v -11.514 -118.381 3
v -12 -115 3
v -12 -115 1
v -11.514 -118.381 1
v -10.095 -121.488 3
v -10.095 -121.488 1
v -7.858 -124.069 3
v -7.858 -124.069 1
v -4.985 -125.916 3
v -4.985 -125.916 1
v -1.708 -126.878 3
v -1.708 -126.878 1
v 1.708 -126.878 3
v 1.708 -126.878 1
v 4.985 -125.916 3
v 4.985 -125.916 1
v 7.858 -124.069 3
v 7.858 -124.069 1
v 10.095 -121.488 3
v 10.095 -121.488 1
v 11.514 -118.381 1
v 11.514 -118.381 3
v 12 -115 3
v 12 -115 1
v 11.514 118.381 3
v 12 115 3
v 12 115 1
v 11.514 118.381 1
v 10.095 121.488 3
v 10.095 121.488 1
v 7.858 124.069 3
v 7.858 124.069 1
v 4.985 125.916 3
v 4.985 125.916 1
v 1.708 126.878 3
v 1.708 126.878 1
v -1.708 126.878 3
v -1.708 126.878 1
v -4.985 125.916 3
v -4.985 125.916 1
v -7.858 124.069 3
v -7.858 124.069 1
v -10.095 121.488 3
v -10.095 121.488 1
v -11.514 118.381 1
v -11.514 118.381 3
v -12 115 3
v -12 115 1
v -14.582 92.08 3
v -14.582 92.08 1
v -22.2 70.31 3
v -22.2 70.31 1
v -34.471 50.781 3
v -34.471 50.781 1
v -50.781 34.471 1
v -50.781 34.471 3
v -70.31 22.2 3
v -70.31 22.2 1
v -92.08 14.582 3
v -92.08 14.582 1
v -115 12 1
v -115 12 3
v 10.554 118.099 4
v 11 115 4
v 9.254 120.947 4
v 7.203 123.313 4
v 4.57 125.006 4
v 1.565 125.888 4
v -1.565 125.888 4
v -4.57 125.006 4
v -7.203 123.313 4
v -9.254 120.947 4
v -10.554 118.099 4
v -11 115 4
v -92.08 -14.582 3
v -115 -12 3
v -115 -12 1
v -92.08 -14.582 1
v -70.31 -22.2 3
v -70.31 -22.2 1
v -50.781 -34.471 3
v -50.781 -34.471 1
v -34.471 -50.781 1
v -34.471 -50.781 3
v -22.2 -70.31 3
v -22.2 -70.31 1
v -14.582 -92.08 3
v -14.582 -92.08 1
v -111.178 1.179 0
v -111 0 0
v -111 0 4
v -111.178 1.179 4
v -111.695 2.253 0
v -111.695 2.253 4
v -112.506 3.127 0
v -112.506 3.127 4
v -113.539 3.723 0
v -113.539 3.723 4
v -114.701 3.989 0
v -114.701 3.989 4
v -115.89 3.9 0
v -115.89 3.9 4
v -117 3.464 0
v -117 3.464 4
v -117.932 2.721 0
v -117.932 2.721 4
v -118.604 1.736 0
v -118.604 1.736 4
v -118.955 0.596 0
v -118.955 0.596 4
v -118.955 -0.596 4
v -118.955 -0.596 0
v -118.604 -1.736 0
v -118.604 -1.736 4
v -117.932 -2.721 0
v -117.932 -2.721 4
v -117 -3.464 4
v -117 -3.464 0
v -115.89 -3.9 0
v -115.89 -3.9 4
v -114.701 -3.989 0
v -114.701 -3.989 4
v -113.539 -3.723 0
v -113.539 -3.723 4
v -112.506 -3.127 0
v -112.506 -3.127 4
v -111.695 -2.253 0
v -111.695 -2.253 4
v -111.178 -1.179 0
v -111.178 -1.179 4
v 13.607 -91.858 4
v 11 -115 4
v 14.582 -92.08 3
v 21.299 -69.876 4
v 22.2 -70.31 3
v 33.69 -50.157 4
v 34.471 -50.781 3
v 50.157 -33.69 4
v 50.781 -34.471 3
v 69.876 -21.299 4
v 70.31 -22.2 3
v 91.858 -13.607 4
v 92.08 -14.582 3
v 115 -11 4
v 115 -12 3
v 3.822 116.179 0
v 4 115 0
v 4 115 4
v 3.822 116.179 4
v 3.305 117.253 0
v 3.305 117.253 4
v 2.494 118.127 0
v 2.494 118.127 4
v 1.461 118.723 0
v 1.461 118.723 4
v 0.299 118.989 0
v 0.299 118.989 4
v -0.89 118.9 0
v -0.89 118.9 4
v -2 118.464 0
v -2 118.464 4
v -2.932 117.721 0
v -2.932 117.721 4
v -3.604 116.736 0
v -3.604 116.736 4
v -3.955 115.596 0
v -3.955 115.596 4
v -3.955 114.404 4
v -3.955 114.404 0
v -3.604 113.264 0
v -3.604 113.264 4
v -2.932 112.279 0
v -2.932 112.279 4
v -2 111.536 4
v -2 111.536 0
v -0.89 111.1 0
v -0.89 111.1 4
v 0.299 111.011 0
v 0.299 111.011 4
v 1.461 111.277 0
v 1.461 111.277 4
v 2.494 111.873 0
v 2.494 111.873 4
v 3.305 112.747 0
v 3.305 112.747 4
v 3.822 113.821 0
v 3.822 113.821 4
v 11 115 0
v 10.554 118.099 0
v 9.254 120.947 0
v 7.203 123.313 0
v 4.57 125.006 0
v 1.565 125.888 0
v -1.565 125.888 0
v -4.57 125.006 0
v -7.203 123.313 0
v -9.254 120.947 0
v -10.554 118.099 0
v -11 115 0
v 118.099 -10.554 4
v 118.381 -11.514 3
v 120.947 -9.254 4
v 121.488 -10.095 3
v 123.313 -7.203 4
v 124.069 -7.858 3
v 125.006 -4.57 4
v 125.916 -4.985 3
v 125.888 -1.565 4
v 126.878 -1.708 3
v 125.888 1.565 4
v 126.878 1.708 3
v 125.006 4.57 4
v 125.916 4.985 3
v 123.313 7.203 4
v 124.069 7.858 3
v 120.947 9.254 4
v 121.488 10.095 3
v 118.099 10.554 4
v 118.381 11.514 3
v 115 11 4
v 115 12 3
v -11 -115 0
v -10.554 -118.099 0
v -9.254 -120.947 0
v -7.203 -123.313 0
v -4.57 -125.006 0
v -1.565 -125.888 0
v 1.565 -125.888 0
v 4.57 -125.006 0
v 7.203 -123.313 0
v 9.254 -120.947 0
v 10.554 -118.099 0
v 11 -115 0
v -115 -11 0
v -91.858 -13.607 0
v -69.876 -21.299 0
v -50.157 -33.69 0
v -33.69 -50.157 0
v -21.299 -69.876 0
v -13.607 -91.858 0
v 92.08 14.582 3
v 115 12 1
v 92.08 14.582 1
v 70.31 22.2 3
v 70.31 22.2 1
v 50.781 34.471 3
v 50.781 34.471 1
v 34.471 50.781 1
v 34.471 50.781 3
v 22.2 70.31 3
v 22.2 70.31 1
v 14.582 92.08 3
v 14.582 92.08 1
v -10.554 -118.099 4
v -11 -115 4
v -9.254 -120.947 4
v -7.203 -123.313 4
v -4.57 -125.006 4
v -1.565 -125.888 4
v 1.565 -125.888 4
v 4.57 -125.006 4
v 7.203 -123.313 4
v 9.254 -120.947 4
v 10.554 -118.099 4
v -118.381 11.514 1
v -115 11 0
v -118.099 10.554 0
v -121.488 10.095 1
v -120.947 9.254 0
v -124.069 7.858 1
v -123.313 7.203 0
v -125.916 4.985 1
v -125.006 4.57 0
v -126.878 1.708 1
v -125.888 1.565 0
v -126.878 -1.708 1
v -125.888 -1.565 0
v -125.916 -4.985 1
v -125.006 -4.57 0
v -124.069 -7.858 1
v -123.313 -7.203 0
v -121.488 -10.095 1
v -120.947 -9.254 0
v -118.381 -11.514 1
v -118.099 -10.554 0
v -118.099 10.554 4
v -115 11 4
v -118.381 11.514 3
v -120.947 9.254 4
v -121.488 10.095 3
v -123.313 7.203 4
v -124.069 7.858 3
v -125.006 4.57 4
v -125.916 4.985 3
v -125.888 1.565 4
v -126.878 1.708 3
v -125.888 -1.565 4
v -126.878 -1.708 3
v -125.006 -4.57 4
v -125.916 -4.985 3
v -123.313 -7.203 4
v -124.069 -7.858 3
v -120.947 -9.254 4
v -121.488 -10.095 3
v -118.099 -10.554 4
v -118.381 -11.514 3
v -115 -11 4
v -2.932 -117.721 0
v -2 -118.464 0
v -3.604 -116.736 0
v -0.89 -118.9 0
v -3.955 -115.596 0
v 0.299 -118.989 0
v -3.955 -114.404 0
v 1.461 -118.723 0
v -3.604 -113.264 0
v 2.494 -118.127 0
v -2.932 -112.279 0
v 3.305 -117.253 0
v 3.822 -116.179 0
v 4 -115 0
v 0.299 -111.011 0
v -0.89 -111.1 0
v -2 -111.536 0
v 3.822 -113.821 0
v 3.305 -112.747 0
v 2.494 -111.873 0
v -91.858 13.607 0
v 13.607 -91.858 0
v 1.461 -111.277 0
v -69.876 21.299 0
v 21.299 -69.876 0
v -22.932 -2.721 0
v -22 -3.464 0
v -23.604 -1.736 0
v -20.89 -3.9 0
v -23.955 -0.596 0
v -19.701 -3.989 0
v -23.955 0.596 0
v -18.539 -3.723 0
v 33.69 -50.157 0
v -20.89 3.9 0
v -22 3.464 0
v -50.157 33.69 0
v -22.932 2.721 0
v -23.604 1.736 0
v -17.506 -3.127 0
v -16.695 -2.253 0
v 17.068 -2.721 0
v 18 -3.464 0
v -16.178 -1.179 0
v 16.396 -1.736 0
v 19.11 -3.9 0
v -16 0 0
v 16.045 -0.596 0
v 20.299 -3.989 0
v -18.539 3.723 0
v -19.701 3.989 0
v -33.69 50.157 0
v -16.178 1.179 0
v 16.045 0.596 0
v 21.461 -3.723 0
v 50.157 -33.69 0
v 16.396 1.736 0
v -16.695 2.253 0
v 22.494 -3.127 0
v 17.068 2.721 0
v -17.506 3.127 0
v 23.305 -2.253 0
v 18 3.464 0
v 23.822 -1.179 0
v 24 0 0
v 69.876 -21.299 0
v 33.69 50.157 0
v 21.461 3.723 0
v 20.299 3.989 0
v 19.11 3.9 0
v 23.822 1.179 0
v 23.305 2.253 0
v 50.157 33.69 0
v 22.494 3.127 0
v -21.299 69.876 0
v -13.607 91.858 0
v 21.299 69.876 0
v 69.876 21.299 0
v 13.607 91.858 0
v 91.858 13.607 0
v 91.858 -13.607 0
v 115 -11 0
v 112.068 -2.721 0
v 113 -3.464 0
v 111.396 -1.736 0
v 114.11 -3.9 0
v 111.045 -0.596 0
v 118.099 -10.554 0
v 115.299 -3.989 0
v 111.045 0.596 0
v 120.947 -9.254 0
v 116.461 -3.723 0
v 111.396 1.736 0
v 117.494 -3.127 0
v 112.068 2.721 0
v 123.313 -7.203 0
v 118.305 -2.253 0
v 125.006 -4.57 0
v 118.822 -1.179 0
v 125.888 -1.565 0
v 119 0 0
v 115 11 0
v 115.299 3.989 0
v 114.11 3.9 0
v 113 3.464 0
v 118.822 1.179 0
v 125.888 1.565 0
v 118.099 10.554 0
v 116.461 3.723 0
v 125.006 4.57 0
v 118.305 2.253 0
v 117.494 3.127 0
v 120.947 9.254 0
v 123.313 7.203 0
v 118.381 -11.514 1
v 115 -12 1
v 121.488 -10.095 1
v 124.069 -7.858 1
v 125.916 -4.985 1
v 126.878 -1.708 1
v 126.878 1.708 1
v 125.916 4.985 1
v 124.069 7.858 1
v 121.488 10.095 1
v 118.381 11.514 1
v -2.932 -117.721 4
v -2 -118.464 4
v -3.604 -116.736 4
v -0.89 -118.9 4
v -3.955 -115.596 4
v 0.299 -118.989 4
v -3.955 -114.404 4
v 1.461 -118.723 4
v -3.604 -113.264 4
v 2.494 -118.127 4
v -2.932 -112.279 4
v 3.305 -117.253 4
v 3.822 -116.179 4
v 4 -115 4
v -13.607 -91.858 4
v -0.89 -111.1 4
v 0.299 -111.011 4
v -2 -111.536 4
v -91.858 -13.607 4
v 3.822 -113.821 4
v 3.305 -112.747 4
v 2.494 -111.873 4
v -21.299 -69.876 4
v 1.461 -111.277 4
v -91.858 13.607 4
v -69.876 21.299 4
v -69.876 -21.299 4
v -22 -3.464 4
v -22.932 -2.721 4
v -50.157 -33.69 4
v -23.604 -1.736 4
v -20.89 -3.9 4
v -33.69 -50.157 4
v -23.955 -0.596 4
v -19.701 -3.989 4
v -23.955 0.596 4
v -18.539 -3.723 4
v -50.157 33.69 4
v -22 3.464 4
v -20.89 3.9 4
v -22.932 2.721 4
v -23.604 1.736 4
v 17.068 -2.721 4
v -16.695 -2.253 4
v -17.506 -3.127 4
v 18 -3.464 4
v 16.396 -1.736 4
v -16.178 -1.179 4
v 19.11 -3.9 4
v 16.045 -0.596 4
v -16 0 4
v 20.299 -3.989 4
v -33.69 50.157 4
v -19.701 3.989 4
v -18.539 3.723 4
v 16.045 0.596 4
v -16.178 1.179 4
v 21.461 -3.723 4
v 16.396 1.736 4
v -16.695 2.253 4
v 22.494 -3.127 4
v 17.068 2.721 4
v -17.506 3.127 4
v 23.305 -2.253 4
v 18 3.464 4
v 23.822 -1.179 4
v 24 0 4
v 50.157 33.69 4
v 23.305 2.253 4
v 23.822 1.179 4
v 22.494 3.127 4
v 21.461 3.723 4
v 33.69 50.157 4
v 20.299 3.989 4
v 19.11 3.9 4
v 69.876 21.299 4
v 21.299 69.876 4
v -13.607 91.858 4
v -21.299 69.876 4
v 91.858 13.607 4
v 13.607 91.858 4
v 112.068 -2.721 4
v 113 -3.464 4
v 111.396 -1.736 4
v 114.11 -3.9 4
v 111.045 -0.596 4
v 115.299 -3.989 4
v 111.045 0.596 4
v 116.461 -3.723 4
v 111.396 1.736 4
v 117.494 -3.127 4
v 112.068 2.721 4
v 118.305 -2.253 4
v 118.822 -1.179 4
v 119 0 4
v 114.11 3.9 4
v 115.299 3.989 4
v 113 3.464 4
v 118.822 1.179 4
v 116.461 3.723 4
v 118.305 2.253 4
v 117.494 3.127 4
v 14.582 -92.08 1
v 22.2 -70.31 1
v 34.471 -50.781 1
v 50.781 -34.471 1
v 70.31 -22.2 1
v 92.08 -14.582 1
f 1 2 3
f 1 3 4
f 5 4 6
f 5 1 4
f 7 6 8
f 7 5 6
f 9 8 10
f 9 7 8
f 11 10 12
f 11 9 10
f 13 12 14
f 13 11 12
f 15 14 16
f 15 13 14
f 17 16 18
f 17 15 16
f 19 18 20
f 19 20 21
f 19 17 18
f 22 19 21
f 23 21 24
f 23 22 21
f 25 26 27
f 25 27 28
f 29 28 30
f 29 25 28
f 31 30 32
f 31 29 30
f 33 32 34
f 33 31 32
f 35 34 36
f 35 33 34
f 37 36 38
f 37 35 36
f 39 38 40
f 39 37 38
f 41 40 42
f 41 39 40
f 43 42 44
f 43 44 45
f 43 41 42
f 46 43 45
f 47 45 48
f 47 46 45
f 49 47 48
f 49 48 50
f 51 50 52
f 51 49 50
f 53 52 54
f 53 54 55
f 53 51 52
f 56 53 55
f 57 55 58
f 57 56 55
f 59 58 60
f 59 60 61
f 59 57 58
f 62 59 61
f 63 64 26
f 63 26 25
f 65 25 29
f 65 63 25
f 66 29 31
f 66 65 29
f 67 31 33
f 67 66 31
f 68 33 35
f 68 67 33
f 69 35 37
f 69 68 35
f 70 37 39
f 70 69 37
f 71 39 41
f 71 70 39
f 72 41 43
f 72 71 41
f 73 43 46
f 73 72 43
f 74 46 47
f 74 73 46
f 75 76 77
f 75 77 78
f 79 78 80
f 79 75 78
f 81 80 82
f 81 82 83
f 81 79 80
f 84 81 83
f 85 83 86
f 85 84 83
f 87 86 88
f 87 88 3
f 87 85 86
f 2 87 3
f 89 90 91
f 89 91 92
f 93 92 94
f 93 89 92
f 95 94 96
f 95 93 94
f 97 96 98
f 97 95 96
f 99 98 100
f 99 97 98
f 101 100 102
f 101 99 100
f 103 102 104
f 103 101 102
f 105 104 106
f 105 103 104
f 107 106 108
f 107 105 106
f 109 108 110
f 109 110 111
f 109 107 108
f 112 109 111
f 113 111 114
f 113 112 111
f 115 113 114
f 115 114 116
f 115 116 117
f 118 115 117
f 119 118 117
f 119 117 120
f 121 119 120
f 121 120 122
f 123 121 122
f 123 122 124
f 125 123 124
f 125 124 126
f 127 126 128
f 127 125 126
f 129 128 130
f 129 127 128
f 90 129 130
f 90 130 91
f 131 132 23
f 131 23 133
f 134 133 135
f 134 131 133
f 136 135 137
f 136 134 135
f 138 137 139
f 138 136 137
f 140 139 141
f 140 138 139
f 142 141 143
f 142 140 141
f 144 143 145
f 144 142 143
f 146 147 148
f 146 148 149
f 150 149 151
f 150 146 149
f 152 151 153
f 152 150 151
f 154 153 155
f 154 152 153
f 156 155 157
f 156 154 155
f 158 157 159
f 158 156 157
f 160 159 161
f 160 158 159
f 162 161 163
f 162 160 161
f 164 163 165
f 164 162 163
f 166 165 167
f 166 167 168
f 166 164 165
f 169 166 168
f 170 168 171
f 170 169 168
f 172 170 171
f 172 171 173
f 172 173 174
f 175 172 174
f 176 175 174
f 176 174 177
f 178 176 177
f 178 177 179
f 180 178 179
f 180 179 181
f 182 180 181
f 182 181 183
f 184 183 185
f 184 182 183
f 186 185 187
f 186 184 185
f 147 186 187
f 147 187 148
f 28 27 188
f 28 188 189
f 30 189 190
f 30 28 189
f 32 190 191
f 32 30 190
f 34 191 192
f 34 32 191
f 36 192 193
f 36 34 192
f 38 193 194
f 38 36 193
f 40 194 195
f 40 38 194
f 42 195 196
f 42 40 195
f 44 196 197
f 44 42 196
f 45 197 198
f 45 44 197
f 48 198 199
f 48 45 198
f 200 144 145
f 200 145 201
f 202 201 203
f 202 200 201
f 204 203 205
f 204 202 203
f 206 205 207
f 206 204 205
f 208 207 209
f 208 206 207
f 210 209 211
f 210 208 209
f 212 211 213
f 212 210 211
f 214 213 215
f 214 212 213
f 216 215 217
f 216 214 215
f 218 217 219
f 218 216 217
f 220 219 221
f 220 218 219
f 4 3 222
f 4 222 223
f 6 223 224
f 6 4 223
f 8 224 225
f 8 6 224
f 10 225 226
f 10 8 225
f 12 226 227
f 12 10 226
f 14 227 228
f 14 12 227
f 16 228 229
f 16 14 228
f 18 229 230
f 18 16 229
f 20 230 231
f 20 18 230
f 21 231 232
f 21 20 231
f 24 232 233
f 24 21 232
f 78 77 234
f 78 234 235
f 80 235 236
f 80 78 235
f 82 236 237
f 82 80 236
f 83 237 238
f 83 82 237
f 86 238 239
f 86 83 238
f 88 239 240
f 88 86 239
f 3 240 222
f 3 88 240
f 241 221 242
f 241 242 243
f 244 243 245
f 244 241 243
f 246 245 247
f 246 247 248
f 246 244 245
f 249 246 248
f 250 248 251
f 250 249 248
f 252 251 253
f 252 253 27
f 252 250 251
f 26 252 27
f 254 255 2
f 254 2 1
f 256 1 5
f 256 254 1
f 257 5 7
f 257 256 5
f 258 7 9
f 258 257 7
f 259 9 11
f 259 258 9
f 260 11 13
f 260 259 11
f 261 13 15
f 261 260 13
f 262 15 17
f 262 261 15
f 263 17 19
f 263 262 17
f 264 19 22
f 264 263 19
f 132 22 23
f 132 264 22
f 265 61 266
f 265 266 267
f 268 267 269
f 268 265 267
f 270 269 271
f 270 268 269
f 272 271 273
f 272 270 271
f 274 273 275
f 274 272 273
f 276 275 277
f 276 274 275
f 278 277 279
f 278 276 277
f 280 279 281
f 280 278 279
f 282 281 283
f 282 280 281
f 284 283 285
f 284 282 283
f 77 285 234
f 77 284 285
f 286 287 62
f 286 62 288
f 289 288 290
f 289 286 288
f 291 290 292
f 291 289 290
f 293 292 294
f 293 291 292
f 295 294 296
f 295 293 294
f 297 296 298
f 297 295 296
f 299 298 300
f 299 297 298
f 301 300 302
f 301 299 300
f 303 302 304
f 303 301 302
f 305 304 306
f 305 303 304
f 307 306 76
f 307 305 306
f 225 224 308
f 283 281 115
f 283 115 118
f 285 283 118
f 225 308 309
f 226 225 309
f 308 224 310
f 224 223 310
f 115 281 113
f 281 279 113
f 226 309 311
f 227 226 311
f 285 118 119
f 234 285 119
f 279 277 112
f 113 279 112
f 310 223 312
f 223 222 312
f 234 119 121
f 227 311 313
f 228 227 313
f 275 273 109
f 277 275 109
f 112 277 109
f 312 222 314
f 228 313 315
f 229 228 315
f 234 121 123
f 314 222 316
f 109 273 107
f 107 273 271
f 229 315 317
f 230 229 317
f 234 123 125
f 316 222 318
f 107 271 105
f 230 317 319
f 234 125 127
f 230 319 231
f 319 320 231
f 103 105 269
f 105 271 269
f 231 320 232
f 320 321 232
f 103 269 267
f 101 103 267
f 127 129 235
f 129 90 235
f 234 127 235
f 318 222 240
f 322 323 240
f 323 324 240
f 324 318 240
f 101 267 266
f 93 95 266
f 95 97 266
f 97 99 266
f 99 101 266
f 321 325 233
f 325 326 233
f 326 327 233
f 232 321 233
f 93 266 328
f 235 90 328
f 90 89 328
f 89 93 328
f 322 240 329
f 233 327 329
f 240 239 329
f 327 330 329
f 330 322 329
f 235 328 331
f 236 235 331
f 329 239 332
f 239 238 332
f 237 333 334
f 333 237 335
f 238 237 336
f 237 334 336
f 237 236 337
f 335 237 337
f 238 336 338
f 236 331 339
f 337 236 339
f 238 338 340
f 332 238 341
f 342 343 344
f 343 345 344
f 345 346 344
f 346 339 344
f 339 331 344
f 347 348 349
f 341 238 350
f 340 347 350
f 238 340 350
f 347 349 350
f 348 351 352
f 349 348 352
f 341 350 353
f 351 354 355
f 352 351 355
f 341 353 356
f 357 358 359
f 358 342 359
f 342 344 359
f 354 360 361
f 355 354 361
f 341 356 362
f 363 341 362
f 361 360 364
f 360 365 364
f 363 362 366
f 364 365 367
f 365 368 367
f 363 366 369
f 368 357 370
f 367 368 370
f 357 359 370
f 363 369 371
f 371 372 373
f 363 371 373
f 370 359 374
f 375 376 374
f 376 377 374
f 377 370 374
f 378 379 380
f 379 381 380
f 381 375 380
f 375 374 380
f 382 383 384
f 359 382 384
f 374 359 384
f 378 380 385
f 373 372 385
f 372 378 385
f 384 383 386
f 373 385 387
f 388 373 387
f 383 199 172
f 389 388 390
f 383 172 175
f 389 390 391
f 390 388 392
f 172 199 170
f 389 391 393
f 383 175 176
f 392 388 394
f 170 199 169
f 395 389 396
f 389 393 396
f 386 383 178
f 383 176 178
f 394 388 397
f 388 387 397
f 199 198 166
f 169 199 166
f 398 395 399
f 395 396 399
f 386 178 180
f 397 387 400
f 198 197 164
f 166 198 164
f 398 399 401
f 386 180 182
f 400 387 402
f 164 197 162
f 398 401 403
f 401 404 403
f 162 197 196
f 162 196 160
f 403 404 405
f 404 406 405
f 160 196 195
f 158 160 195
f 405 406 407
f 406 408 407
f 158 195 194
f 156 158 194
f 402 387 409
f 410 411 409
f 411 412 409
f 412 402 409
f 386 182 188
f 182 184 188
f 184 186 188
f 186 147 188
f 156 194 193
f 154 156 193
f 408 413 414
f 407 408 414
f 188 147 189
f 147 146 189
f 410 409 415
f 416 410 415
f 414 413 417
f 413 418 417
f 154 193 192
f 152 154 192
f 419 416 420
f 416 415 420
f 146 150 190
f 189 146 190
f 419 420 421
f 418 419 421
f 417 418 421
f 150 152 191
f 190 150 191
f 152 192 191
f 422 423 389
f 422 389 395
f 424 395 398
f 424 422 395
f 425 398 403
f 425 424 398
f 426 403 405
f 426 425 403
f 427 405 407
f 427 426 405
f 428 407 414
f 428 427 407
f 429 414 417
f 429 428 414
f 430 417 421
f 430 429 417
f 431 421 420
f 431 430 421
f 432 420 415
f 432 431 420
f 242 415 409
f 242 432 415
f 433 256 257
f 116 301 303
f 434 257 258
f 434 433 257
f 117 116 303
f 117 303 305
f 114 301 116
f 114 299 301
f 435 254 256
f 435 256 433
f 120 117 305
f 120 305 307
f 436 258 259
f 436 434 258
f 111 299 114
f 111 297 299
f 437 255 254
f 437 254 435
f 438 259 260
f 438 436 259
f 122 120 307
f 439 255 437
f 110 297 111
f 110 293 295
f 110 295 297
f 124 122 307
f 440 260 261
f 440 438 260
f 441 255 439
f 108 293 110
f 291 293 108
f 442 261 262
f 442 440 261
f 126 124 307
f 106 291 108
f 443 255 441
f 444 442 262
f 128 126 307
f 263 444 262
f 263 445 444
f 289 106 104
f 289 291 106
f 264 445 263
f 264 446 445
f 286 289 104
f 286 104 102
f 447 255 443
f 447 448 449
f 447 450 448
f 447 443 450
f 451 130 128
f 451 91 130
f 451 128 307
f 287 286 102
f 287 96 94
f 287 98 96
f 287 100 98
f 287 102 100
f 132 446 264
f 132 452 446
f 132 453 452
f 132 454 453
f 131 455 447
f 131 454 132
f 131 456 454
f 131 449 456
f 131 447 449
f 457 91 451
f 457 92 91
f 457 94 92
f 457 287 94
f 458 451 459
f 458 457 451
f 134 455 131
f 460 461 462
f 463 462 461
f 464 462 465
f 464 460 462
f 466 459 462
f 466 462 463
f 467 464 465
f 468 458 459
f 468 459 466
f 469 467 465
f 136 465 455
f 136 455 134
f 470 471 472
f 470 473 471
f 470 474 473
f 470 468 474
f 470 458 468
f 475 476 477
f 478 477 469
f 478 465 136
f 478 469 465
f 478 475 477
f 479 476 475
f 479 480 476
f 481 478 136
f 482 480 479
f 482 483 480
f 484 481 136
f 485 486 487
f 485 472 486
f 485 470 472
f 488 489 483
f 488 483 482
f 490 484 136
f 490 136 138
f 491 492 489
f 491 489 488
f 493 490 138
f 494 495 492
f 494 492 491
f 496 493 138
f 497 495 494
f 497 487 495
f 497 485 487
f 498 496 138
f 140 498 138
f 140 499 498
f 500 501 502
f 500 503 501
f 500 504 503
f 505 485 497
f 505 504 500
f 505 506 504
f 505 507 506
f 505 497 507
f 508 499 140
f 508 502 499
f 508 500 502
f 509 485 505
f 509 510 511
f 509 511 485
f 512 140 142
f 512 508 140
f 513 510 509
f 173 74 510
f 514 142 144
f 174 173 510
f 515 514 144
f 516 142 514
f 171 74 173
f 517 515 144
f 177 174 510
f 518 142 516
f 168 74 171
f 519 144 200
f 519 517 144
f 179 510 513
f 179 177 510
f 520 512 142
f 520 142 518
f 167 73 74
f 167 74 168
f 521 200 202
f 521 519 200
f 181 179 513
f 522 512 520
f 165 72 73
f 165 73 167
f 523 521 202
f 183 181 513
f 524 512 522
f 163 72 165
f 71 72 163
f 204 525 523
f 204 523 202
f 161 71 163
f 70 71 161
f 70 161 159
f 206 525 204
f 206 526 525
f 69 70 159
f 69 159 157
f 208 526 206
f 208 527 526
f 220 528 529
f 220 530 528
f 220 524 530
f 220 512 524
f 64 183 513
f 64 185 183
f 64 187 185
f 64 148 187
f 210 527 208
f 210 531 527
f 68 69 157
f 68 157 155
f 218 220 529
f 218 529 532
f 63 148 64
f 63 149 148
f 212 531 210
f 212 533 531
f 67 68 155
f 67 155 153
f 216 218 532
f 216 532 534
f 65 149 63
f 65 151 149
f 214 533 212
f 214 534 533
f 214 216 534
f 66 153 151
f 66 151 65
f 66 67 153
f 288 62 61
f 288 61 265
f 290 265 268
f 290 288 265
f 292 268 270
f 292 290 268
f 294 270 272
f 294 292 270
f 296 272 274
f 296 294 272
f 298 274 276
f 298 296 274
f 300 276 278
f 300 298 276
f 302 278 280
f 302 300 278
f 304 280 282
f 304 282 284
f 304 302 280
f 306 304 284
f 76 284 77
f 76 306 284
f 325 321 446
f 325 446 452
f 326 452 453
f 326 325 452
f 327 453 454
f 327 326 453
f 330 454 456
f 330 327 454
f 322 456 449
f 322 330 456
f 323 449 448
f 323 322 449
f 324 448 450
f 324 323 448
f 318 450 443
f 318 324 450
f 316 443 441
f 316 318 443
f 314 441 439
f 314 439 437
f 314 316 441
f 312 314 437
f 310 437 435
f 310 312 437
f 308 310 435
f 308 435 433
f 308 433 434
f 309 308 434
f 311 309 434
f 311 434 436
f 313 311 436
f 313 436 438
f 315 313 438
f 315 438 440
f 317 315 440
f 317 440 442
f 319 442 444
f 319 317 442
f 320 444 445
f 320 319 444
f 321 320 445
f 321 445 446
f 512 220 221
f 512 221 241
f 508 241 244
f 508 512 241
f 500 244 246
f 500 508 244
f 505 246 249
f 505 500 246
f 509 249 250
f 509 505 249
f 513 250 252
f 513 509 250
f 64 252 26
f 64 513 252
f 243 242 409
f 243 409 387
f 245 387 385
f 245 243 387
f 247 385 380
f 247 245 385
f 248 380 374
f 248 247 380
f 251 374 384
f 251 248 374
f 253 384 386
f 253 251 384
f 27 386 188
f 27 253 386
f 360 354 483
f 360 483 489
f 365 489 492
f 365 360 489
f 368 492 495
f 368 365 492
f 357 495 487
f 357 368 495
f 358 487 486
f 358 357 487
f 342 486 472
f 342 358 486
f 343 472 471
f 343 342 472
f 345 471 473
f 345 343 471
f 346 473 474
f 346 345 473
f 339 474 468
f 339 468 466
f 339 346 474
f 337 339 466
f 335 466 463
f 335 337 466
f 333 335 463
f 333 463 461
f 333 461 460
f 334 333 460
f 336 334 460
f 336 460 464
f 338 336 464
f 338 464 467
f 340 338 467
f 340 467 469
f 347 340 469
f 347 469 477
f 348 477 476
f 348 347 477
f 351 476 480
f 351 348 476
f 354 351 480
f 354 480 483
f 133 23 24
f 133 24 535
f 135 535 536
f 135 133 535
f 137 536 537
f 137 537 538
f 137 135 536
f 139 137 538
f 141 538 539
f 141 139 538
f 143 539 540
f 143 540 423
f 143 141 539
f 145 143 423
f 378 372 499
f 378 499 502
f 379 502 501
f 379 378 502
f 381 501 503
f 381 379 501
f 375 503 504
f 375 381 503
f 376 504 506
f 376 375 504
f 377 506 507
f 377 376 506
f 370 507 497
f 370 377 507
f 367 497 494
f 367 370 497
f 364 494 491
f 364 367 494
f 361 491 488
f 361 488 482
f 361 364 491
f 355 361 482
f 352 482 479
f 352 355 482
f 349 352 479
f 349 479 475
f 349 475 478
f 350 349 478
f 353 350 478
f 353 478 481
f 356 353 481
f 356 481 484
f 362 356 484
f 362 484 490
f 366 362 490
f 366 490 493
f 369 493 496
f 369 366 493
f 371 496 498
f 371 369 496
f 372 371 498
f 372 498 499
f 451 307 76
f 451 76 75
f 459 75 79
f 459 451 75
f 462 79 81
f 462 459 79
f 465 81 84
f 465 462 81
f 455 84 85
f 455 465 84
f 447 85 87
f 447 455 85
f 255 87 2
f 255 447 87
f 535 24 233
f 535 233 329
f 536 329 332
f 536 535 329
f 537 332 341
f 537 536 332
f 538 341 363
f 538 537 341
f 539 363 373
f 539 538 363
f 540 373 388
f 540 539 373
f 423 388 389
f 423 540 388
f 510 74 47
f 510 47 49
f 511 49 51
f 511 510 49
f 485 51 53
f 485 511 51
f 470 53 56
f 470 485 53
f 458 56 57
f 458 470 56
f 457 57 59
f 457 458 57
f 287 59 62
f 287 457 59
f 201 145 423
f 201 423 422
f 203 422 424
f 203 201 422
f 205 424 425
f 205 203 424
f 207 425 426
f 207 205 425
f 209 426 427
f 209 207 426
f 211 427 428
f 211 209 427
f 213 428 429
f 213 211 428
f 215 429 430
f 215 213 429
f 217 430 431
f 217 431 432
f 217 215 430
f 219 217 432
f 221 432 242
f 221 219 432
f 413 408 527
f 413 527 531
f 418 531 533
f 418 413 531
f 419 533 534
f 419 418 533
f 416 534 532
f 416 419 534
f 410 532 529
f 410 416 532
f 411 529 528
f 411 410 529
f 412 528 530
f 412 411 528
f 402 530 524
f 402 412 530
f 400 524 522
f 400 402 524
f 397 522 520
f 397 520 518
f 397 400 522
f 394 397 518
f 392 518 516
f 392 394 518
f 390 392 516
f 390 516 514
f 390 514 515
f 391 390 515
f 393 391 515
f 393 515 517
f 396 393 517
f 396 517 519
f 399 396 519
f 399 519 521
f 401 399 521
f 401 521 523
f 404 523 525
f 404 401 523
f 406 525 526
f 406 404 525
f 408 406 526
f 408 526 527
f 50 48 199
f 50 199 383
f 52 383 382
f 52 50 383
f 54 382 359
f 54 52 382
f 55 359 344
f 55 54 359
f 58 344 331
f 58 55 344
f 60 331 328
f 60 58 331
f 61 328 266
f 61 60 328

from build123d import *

# Parameters (mm, degrees)
IZIM1_R                     = 132.5
IZIM1_R_2                   = 4
Y_KSEKLIK_EKSTR_ZYON1_DEPTH = 4
SKETCH1_R                   = 147.896519427
CUT_EXTRUDE2_DEPTH          = 10
CHAMFER1_SIZE               = 1


with BuildPart() as part:
    # Çizim1 → Yükseklik-Ekstrüzyon1 (new body)
    with BuildSketch(Plane.XY):
        Circle(IZIM1_R)
        with Locations((0, 115)):
            Circle(IZIM1_R_2, mode=Mode.SUBTRACT)
        with Locations((115, 0)):
            Circle(IZIM1_R_2, mode=Mode.SUBTRACT)
        with Locations((0, -115)):
            Circle(IZIM1_R_2, mode=Mode.SUBTRACT)
        with Locations((-115, 0)):
            Circle(IZIM1_R_2, mode=Mode.SUBTRACT)
        with Locations((-20, 0)):
            Circle(IZIM1_R_2, mode=Mode.SUBTRACT)
        with Locations((20, 0)):
            Circle(IZIM1_R_2, mode=Mode.SUBTRACT)
    extrude(amount=Y_KSEKLIK_EKSTR_ZYON1_DEPTH)

    # Sketch1 → Cut-Extrude2 (cut)
    with BuildSketch(Plane.XY.offset(4)):
        Circle(SKETCH1_R)
        with BuildLine():
            ThreePointArc((12, 115), (0, 127), (-12, 115))
            ThreePointArc((-12, 115), (-42.168001538, 42.168001538), (-115, 12))
            ThreePointArc((-115, 12), (-127, 0), (-115, -12))
            ThreePointArc((-115, -12), (-42.168001538, -42.168001538), (-12, -115))
            ThreePointArc((-12, -115), (0, -127), (12, -115))
            ThreePointArc((12, -115), (42.168001538, -42.168001538), (115, -12))
            ThreePointArc((115, -12), (127, 0), (115, 12))
            ThreePointArc((115, 12), (42.168001538, 42.168001538), (12, 115))
        make_face(mode=Mode.SUBTRACT)
    extrude(amount=-CUT_EXTRUDE2_DEPTH, mode=Mode.SUBTRACT)

    # Chamfer1
    chamfer1_edges = [part.edges().sort_by_distance(p)[0] for p in [
        (127, 0, 0),
        (42.168001538, 42.168001538, 0),
        (0, 127, 0),
        (-42.168001538, 42.168001538, 0),
        (-127, 0, 0),
        (-42.168001538, -42.168001538, 0),
        (0, -127, 0),
        (42.168001538, -42.168001538, 0),
        (-42.168001538, -42.168001538, 4),
        (-127, 0, 4),
        (0, 127, 4),
        (42.168001538, 42.168001538, 4),
        (127, 0, 4),
        (42.168001538, -42.168001538, 4),
        (0, -127, 4),
        (-42.168001538, 42.168001538, 4),
    ]]
    chamfer(chamfer1_edges, length=CHAMFER1_SIZE)


solid = part.part
